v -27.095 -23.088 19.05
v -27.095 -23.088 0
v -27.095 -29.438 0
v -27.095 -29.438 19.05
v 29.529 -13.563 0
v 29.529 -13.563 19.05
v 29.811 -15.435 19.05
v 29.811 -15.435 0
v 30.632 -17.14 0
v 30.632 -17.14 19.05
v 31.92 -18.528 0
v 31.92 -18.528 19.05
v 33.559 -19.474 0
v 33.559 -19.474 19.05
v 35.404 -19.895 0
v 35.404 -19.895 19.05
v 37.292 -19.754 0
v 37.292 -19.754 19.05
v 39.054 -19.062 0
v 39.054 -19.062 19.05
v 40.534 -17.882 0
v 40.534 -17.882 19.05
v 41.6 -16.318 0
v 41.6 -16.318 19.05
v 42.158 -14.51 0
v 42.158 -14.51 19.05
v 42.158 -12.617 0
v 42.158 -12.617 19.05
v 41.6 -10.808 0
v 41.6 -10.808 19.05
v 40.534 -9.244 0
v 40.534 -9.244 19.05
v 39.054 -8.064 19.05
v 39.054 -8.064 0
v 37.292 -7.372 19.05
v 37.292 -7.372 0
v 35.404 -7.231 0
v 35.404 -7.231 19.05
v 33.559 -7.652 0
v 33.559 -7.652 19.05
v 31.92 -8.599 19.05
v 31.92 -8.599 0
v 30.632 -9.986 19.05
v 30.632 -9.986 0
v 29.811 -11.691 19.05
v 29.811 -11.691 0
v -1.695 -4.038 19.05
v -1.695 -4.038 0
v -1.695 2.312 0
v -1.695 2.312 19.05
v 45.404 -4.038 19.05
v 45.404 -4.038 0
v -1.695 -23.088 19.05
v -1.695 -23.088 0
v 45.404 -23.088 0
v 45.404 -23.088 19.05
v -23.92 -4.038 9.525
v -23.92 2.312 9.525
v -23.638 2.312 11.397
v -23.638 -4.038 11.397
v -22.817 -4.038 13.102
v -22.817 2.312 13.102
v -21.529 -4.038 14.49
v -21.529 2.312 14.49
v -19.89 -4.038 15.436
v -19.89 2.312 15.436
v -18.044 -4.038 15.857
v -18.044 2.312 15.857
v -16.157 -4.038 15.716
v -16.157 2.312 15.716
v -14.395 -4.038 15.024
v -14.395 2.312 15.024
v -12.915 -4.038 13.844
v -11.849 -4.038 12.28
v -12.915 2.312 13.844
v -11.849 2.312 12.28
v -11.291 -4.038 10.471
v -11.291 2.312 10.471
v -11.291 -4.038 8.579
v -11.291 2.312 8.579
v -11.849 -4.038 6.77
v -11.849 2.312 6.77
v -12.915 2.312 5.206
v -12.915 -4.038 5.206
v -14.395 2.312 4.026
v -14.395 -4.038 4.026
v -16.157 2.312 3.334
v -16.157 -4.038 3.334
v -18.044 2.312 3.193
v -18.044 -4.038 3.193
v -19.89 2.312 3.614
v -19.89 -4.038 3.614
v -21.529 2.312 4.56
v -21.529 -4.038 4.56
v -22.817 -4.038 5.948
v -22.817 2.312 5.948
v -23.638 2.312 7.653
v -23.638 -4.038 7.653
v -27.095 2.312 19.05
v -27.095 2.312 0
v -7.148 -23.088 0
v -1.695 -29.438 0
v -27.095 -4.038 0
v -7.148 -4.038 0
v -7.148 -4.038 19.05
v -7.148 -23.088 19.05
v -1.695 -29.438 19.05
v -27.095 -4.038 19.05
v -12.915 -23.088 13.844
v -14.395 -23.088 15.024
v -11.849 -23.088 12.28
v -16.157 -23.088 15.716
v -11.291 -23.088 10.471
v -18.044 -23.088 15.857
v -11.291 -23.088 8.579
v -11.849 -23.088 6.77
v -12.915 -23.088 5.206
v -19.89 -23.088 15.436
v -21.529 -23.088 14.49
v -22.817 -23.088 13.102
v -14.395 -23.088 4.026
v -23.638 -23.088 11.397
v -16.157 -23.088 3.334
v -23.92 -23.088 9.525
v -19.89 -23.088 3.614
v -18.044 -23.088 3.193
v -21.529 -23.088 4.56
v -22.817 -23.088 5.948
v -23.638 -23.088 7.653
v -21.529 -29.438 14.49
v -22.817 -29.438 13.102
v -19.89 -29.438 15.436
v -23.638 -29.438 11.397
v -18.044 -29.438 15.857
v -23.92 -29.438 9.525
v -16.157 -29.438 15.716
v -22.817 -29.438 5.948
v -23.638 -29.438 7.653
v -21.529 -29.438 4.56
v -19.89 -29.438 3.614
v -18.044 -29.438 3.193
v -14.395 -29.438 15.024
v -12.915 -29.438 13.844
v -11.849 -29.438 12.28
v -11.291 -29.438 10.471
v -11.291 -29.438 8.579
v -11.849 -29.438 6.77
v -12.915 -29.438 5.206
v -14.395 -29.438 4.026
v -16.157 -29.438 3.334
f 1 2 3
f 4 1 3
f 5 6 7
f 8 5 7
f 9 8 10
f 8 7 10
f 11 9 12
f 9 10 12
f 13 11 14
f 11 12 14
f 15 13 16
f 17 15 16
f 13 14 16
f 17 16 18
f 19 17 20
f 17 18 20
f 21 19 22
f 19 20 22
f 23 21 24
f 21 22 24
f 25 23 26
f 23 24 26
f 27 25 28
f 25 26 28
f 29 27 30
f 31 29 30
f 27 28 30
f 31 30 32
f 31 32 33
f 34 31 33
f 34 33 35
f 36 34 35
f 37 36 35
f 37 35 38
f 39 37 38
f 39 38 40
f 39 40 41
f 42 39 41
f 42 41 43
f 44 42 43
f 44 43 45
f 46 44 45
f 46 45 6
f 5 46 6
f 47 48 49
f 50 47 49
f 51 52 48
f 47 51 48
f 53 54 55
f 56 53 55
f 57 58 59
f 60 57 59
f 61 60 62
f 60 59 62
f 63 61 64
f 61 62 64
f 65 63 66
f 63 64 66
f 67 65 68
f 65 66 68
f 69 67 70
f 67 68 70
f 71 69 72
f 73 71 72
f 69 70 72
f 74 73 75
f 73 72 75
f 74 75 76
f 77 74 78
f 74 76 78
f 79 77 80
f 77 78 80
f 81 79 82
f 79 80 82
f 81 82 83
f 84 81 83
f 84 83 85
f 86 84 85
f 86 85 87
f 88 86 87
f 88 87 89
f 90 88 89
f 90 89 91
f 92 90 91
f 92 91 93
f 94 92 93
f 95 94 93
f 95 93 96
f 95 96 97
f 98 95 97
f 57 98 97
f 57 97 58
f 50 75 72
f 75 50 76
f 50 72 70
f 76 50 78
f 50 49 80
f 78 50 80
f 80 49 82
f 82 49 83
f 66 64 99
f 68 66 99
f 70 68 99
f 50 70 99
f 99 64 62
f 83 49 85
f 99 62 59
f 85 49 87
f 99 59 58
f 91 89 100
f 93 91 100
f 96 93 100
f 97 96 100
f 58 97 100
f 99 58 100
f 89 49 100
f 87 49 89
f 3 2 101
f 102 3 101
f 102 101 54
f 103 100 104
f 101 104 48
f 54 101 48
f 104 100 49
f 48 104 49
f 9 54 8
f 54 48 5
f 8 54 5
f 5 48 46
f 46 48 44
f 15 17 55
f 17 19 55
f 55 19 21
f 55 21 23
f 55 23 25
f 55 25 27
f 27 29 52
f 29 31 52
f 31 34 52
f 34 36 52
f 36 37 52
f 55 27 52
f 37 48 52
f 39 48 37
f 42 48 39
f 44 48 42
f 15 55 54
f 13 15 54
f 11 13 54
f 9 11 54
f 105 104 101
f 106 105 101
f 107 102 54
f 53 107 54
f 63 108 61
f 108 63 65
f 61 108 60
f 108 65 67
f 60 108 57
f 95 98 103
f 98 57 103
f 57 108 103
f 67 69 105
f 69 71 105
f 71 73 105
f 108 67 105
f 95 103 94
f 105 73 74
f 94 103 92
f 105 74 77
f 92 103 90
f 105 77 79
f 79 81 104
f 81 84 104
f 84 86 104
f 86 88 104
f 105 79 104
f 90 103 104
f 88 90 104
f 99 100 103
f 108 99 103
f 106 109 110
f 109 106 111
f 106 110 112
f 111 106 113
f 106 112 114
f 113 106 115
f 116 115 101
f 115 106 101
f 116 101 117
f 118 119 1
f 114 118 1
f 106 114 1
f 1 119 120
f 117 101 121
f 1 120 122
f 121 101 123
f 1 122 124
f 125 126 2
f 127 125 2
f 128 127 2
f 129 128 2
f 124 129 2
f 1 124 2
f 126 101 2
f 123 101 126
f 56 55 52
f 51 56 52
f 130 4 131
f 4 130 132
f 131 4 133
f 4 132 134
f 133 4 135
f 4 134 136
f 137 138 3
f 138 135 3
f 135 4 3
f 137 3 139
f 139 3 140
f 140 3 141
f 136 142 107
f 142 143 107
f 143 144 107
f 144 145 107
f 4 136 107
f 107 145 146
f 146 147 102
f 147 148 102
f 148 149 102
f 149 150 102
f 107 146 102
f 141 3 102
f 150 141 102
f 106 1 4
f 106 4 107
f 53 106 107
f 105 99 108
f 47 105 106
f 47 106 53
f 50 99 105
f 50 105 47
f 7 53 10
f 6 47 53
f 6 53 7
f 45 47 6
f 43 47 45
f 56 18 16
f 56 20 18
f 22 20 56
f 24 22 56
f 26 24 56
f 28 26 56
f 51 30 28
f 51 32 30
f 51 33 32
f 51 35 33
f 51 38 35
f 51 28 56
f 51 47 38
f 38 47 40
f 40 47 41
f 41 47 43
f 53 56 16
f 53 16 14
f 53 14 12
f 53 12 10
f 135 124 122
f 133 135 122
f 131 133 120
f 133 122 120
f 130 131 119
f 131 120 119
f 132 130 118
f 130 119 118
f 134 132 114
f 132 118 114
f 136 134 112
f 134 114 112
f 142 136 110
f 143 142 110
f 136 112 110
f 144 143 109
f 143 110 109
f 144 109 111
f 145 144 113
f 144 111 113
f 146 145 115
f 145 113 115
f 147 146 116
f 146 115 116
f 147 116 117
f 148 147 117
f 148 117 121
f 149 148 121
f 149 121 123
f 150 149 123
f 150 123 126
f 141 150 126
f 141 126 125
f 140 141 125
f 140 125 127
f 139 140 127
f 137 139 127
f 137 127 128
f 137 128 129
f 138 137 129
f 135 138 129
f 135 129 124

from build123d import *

# Parameters (mm, degrees)
F1_DEPTH = 19.05
F3_D     = 12.7
F5_D     = 12.7


with BuildPart() as f1:
    # F0 (on Top) → F1 (new body)
    with BuildSketch(Plane.XY):
        Polygon((45.4040161939, -4.0381300203), (-1.6949172365, -4.0381300203), (-1.6949172365, 2.3118699797), (-27.0949172365, 2.3118699797), (-27.0949172365, -4.0381300203), (-7.1481281937, -4.0381300203), (-7.1481281937, -23.0881300203), (-27.0949172365, -23.0881300203), (-27.0949172365, -29.4381300203), (-1.6949172365, -29.4381300203), (-1.6949172365, -23.0881300203), (45.4040161939, -23.0881300203), align=None)
    extrude(amount=F1_DEPTH)

    # F3 (through all)
    with Locations(Plane.XZ.offset(29.4381300203)):
        with Locations((-17.5699172365, 9.525)):
            Hole(F3_D / 2)

    # F5 (through all)
    with Locations(Plane(origin=(0, 0, 0), x_dir=(1, 0, 0), z_dir=(0, 0, -1))):
        with Locations((35.8790161939, 13.5631300203)):
            Hole(F5_D / 2)


solid = f1.part
